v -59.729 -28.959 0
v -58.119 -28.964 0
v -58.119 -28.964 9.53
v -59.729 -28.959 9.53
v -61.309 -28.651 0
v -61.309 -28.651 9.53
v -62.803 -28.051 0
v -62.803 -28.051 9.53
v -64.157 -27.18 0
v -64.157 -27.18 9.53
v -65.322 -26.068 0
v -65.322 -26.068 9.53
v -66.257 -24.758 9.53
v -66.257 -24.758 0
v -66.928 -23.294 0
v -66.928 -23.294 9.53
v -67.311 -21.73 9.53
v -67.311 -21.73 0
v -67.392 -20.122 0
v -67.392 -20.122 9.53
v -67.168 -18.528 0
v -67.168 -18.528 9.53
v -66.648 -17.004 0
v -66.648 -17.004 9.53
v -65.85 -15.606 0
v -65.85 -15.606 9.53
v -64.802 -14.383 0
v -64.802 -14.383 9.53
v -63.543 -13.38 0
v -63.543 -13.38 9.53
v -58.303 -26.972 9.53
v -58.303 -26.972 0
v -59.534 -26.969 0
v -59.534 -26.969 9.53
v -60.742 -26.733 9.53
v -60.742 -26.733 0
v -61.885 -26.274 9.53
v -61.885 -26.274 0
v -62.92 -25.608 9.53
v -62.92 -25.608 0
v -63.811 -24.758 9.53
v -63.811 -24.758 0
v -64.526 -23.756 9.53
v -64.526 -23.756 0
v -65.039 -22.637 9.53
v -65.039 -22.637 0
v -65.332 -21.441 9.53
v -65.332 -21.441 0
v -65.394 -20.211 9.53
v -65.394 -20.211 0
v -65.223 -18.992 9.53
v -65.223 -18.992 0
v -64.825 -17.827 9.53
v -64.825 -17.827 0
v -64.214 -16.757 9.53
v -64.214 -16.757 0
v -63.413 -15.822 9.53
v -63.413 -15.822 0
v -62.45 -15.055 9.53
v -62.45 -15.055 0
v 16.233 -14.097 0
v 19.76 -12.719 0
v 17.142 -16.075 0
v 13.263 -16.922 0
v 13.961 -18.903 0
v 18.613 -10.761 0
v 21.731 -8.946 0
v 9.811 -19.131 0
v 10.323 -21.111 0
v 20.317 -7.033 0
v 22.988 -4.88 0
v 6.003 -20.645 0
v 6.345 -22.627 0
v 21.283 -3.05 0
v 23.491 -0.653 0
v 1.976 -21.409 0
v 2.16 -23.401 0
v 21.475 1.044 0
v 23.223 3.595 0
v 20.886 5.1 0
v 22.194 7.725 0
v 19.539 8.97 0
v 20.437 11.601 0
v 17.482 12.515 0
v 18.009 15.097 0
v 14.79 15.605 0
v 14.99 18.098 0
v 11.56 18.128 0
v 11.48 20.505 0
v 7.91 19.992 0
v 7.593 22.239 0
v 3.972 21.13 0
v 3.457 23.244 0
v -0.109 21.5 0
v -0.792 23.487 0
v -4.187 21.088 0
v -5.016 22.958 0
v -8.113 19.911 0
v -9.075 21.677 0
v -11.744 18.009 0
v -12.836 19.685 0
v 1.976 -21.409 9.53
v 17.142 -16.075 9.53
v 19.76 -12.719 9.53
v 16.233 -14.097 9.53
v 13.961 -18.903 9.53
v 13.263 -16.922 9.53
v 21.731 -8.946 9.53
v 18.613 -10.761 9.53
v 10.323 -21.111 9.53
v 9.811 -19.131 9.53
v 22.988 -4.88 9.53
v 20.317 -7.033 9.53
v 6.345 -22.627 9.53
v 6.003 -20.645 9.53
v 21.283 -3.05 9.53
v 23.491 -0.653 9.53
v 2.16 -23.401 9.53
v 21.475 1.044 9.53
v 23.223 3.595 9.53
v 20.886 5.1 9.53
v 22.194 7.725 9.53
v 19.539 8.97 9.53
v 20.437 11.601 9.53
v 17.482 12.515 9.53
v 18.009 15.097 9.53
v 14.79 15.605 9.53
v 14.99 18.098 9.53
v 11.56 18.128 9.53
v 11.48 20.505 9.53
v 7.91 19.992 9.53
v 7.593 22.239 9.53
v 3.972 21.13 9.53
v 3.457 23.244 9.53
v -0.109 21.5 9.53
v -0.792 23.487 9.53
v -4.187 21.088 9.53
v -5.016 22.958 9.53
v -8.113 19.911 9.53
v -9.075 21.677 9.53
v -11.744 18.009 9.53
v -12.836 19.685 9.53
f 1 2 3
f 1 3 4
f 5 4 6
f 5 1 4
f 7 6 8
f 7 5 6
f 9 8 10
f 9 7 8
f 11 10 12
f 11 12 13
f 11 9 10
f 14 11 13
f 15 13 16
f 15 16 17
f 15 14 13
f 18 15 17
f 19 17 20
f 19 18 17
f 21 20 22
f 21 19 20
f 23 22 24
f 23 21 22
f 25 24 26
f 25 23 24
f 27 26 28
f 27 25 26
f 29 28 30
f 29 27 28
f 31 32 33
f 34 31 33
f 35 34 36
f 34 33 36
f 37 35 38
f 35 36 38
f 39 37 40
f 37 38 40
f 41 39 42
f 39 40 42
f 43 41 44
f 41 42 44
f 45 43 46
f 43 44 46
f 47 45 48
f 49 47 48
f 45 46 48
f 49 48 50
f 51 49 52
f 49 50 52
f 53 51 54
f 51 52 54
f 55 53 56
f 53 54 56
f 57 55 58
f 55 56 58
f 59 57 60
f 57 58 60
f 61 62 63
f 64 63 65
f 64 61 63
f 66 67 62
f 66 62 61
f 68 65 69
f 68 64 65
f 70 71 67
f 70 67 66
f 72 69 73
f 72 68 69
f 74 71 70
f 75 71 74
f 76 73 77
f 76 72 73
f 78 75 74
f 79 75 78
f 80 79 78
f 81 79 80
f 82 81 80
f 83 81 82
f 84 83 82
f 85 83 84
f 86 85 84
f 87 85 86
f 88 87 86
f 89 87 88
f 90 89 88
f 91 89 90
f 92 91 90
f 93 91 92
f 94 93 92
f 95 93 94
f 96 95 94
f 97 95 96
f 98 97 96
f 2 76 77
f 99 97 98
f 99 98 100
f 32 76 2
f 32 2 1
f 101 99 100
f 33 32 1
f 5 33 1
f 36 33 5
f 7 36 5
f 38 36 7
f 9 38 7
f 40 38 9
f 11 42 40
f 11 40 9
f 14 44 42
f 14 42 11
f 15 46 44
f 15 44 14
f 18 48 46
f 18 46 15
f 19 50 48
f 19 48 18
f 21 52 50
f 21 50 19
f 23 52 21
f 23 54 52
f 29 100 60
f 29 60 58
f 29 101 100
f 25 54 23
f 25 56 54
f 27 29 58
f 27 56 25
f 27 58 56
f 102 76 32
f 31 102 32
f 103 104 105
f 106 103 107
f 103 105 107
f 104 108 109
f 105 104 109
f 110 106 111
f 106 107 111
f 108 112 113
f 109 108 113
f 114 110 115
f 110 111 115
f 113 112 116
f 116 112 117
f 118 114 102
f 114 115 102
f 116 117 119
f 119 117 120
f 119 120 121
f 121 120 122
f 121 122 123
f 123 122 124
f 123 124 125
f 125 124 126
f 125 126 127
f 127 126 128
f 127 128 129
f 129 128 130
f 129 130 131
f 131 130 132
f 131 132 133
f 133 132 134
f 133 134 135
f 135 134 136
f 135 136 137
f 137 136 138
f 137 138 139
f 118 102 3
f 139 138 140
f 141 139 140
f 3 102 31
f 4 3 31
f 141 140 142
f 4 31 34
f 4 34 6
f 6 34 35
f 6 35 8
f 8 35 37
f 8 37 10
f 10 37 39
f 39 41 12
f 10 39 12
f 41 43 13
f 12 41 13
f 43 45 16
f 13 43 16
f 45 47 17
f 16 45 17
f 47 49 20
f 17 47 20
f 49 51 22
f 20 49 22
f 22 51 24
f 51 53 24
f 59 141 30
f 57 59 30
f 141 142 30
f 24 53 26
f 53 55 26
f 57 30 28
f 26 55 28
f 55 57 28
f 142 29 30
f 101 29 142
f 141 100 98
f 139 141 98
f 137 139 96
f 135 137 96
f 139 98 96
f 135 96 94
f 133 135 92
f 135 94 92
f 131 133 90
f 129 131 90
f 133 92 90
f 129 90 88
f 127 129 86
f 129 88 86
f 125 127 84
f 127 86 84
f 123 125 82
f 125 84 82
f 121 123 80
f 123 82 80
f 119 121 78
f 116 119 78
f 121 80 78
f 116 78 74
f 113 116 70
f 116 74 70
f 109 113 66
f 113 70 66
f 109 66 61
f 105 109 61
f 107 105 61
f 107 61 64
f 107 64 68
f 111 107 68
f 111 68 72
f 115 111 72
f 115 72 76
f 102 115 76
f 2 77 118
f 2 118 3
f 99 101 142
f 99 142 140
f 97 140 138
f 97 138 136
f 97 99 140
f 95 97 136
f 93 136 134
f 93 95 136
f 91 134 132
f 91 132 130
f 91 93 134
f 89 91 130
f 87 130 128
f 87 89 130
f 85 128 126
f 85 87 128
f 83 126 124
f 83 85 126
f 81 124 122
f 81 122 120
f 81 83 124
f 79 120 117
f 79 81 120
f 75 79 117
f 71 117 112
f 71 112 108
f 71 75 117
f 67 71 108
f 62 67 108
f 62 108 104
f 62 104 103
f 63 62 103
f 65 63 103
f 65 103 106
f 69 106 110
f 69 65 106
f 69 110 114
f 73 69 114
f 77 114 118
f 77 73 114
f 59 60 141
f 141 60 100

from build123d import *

# Parameters (mm, degrees)
EXTRUS_O_FINA1_DEPTH = 9.53


with BuildPart() as part:
    # Esboço2 → Extrusão-Fina1 (new body)
    with BuildSketch(Plane.XY):
        with BuildLine():
            Line((-63.542787432, -13.379991232), (-12.835941724, 19.684730124))
            ThreePointArc((-12.835941724, 19.684730124), (22.194149255, 7.724619011), (2.159781023, -23.400541573))
            Line((2.159781023, -23.400541573), (-58.118802609, -28.964025676))
            ThreePointArc((-58.118802609, -28.964025676), (-66.927671007, -23.294011131), (-63.542787432, -13.379991232))
        make_face()
        with BuildLine():
            Line((-62.45036686, -15.055287412), (-11.743521152, 18.009433943))
            ThreePointArc((-11.743521152, 18.009433943), (20.305285488, 7.067204627), (1.975969872, -21.40900612))
            Line((1.975969872, -21.40900612), (-58.30261376, -26.972490222))
            ThreePointArc((-58.30261376, -26.972490222), (-65.038807241, -22.636596748), (-62.45036686, -15.055287412))
        make_face(mode=Mode.SUBTRACT)
    extrude(amount=EXTRUS_O_FINA1_DEPTH)


solid = part.part
